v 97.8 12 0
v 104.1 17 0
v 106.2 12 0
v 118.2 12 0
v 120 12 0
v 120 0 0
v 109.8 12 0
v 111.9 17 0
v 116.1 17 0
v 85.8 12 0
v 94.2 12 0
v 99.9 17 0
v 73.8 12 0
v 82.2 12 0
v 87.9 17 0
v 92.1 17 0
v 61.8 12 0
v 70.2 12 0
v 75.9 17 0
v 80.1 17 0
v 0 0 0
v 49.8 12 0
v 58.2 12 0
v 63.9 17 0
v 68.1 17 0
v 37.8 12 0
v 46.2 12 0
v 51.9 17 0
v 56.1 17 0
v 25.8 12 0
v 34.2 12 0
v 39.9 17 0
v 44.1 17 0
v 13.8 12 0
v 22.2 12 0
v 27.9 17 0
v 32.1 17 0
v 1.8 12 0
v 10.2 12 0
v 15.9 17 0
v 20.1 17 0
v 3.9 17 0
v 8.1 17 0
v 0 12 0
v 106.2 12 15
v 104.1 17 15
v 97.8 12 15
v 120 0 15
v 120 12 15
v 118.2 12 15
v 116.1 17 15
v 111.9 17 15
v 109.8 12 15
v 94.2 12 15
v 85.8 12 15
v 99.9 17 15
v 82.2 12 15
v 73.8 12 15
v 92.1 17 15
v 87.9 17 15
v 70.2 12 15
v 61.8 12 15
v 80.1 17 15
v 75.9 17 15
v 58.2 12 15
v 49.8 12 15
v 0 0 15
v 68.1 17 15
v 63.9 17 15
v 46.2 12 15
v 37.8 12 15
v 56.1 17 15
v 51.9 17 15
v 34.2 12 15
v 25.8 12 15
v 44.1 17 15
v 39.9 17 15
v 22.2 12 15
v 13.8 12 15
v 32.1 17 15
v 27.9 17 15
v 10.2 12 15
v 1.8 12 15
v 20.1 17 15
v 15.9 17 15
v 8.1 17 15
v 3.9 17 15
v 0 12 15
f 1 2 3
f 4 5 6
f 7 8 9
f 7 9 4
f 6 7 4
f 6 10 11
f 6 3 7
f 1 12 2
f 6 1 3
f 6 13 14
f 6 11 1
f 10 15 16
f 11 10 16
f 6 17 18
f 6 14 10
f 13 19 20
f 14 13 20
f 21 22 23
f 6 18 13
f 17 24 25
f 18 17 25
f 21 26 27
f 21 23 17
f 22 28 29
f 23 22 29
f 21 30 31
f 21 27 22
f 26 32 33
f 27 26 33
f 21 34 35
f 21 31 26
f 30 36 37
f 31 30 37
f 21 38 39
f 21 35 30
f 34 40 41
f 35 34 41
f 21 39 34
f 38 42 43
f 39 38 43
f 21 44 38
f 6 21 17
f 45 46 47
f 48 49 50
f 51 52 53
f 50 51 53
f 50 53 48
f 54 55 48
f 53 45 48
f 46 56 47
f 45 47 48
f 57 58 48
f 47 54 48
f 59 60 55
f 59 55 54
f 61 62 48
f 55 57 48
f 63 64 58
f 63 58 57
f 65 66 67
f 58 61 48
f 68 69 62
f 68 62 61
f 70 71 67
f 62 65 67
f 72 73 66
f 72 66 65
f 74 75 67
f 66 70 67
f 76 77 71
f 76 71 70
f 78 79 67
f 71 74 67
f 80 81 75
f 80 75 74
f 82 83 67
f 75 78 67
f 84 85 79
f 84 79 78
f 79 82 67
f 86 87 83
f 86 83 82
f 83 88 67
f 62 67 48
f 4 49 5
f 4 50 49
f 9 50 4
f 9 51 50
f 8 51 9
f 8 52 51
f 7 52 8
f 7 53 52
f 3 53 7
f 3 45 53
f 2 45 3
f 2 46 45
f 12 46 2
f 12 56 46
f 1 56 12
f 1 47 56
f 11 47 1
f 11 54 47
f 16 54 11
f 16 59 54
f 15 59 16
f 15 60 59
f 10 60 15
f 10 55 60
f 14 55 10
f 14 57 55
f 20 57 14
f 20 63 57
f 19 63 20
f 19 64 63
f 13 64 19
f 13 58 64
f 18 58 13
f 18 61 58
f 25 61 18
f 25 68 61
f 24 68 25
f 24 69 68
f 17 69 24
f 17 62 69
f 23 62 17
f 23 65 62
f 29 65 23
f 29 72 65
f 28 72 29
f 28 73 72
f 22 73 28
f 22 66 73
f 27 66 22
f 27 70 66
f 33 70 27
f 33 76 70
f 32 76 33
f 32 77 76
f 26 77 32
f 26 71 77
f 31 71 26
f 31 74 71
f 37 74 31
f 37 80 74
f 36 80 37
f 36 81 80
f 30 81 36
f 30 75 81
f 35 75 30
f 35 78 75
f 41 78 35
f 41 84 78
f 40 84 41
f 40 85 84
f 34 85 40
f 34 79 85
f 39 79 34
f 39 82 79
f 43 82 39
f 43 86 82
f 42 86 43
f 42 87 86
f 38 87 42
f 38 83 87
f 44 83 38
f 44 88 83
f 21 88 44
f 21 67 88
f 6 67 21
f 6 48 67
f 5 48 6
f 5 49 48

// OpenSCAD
$fn = 32;

// ----------------------------------------------------------------------
// Gear rack: 10 teeth, pitch 12 mm
// ----------------------------------------------------------------------

// --- parameters (mm) ---
teeth = 10;               // number of teeth
pitch = 12;               // tooth pitch, X
root_w = 8.4;             // tooth width at the root
tip_w = 4.2;              // tooth width at the tip
base_h = 12;              // rack body height, Y
tooth_h = 5;              // tooth height above the body
plate_t = 15;             // rack width, Z (extrusion height)

rack_l = teeth * pitch;  // overall length
total_h = base_h + tooth_h;  // overall height

profile = [[0, 0], [120, 0], [120, 12], [118.2, 12], [116.1, 17], [111.9, 17], [109.8, 12], [106.2, 12], [104.1, 17], [99.9, 17], [97.8, 12], [94.2, 12], [92.1, 17], [87.9, 17], [85.8, 12], [82.2, 12], [80.1, 17], [75.9, 17], [73.8, 12], [70.2, 12], [68.1, 17], [63.9, 17], [61.8, 12], [58.2, 12], [56.1, 17], [51.9, 17], [49.8, 12], [46.2, 12], [44.1, 17], [39.9, 17], [37.8, 12], [34.2, 12], [32.1, 17], [27.9, 17], [25.8, 12], [22.2, 12], [20.1, 17], [15.9, 17], [13.8, 12], [10.2, 12], [8.1, 17], [3.9, 17], [1.8, 12], [0, 12]];  // primary outline, 44 points, counter clockwise

// --- the one profile operation ---
linear_extrude(height = plate_t) polygon(points = profile);
